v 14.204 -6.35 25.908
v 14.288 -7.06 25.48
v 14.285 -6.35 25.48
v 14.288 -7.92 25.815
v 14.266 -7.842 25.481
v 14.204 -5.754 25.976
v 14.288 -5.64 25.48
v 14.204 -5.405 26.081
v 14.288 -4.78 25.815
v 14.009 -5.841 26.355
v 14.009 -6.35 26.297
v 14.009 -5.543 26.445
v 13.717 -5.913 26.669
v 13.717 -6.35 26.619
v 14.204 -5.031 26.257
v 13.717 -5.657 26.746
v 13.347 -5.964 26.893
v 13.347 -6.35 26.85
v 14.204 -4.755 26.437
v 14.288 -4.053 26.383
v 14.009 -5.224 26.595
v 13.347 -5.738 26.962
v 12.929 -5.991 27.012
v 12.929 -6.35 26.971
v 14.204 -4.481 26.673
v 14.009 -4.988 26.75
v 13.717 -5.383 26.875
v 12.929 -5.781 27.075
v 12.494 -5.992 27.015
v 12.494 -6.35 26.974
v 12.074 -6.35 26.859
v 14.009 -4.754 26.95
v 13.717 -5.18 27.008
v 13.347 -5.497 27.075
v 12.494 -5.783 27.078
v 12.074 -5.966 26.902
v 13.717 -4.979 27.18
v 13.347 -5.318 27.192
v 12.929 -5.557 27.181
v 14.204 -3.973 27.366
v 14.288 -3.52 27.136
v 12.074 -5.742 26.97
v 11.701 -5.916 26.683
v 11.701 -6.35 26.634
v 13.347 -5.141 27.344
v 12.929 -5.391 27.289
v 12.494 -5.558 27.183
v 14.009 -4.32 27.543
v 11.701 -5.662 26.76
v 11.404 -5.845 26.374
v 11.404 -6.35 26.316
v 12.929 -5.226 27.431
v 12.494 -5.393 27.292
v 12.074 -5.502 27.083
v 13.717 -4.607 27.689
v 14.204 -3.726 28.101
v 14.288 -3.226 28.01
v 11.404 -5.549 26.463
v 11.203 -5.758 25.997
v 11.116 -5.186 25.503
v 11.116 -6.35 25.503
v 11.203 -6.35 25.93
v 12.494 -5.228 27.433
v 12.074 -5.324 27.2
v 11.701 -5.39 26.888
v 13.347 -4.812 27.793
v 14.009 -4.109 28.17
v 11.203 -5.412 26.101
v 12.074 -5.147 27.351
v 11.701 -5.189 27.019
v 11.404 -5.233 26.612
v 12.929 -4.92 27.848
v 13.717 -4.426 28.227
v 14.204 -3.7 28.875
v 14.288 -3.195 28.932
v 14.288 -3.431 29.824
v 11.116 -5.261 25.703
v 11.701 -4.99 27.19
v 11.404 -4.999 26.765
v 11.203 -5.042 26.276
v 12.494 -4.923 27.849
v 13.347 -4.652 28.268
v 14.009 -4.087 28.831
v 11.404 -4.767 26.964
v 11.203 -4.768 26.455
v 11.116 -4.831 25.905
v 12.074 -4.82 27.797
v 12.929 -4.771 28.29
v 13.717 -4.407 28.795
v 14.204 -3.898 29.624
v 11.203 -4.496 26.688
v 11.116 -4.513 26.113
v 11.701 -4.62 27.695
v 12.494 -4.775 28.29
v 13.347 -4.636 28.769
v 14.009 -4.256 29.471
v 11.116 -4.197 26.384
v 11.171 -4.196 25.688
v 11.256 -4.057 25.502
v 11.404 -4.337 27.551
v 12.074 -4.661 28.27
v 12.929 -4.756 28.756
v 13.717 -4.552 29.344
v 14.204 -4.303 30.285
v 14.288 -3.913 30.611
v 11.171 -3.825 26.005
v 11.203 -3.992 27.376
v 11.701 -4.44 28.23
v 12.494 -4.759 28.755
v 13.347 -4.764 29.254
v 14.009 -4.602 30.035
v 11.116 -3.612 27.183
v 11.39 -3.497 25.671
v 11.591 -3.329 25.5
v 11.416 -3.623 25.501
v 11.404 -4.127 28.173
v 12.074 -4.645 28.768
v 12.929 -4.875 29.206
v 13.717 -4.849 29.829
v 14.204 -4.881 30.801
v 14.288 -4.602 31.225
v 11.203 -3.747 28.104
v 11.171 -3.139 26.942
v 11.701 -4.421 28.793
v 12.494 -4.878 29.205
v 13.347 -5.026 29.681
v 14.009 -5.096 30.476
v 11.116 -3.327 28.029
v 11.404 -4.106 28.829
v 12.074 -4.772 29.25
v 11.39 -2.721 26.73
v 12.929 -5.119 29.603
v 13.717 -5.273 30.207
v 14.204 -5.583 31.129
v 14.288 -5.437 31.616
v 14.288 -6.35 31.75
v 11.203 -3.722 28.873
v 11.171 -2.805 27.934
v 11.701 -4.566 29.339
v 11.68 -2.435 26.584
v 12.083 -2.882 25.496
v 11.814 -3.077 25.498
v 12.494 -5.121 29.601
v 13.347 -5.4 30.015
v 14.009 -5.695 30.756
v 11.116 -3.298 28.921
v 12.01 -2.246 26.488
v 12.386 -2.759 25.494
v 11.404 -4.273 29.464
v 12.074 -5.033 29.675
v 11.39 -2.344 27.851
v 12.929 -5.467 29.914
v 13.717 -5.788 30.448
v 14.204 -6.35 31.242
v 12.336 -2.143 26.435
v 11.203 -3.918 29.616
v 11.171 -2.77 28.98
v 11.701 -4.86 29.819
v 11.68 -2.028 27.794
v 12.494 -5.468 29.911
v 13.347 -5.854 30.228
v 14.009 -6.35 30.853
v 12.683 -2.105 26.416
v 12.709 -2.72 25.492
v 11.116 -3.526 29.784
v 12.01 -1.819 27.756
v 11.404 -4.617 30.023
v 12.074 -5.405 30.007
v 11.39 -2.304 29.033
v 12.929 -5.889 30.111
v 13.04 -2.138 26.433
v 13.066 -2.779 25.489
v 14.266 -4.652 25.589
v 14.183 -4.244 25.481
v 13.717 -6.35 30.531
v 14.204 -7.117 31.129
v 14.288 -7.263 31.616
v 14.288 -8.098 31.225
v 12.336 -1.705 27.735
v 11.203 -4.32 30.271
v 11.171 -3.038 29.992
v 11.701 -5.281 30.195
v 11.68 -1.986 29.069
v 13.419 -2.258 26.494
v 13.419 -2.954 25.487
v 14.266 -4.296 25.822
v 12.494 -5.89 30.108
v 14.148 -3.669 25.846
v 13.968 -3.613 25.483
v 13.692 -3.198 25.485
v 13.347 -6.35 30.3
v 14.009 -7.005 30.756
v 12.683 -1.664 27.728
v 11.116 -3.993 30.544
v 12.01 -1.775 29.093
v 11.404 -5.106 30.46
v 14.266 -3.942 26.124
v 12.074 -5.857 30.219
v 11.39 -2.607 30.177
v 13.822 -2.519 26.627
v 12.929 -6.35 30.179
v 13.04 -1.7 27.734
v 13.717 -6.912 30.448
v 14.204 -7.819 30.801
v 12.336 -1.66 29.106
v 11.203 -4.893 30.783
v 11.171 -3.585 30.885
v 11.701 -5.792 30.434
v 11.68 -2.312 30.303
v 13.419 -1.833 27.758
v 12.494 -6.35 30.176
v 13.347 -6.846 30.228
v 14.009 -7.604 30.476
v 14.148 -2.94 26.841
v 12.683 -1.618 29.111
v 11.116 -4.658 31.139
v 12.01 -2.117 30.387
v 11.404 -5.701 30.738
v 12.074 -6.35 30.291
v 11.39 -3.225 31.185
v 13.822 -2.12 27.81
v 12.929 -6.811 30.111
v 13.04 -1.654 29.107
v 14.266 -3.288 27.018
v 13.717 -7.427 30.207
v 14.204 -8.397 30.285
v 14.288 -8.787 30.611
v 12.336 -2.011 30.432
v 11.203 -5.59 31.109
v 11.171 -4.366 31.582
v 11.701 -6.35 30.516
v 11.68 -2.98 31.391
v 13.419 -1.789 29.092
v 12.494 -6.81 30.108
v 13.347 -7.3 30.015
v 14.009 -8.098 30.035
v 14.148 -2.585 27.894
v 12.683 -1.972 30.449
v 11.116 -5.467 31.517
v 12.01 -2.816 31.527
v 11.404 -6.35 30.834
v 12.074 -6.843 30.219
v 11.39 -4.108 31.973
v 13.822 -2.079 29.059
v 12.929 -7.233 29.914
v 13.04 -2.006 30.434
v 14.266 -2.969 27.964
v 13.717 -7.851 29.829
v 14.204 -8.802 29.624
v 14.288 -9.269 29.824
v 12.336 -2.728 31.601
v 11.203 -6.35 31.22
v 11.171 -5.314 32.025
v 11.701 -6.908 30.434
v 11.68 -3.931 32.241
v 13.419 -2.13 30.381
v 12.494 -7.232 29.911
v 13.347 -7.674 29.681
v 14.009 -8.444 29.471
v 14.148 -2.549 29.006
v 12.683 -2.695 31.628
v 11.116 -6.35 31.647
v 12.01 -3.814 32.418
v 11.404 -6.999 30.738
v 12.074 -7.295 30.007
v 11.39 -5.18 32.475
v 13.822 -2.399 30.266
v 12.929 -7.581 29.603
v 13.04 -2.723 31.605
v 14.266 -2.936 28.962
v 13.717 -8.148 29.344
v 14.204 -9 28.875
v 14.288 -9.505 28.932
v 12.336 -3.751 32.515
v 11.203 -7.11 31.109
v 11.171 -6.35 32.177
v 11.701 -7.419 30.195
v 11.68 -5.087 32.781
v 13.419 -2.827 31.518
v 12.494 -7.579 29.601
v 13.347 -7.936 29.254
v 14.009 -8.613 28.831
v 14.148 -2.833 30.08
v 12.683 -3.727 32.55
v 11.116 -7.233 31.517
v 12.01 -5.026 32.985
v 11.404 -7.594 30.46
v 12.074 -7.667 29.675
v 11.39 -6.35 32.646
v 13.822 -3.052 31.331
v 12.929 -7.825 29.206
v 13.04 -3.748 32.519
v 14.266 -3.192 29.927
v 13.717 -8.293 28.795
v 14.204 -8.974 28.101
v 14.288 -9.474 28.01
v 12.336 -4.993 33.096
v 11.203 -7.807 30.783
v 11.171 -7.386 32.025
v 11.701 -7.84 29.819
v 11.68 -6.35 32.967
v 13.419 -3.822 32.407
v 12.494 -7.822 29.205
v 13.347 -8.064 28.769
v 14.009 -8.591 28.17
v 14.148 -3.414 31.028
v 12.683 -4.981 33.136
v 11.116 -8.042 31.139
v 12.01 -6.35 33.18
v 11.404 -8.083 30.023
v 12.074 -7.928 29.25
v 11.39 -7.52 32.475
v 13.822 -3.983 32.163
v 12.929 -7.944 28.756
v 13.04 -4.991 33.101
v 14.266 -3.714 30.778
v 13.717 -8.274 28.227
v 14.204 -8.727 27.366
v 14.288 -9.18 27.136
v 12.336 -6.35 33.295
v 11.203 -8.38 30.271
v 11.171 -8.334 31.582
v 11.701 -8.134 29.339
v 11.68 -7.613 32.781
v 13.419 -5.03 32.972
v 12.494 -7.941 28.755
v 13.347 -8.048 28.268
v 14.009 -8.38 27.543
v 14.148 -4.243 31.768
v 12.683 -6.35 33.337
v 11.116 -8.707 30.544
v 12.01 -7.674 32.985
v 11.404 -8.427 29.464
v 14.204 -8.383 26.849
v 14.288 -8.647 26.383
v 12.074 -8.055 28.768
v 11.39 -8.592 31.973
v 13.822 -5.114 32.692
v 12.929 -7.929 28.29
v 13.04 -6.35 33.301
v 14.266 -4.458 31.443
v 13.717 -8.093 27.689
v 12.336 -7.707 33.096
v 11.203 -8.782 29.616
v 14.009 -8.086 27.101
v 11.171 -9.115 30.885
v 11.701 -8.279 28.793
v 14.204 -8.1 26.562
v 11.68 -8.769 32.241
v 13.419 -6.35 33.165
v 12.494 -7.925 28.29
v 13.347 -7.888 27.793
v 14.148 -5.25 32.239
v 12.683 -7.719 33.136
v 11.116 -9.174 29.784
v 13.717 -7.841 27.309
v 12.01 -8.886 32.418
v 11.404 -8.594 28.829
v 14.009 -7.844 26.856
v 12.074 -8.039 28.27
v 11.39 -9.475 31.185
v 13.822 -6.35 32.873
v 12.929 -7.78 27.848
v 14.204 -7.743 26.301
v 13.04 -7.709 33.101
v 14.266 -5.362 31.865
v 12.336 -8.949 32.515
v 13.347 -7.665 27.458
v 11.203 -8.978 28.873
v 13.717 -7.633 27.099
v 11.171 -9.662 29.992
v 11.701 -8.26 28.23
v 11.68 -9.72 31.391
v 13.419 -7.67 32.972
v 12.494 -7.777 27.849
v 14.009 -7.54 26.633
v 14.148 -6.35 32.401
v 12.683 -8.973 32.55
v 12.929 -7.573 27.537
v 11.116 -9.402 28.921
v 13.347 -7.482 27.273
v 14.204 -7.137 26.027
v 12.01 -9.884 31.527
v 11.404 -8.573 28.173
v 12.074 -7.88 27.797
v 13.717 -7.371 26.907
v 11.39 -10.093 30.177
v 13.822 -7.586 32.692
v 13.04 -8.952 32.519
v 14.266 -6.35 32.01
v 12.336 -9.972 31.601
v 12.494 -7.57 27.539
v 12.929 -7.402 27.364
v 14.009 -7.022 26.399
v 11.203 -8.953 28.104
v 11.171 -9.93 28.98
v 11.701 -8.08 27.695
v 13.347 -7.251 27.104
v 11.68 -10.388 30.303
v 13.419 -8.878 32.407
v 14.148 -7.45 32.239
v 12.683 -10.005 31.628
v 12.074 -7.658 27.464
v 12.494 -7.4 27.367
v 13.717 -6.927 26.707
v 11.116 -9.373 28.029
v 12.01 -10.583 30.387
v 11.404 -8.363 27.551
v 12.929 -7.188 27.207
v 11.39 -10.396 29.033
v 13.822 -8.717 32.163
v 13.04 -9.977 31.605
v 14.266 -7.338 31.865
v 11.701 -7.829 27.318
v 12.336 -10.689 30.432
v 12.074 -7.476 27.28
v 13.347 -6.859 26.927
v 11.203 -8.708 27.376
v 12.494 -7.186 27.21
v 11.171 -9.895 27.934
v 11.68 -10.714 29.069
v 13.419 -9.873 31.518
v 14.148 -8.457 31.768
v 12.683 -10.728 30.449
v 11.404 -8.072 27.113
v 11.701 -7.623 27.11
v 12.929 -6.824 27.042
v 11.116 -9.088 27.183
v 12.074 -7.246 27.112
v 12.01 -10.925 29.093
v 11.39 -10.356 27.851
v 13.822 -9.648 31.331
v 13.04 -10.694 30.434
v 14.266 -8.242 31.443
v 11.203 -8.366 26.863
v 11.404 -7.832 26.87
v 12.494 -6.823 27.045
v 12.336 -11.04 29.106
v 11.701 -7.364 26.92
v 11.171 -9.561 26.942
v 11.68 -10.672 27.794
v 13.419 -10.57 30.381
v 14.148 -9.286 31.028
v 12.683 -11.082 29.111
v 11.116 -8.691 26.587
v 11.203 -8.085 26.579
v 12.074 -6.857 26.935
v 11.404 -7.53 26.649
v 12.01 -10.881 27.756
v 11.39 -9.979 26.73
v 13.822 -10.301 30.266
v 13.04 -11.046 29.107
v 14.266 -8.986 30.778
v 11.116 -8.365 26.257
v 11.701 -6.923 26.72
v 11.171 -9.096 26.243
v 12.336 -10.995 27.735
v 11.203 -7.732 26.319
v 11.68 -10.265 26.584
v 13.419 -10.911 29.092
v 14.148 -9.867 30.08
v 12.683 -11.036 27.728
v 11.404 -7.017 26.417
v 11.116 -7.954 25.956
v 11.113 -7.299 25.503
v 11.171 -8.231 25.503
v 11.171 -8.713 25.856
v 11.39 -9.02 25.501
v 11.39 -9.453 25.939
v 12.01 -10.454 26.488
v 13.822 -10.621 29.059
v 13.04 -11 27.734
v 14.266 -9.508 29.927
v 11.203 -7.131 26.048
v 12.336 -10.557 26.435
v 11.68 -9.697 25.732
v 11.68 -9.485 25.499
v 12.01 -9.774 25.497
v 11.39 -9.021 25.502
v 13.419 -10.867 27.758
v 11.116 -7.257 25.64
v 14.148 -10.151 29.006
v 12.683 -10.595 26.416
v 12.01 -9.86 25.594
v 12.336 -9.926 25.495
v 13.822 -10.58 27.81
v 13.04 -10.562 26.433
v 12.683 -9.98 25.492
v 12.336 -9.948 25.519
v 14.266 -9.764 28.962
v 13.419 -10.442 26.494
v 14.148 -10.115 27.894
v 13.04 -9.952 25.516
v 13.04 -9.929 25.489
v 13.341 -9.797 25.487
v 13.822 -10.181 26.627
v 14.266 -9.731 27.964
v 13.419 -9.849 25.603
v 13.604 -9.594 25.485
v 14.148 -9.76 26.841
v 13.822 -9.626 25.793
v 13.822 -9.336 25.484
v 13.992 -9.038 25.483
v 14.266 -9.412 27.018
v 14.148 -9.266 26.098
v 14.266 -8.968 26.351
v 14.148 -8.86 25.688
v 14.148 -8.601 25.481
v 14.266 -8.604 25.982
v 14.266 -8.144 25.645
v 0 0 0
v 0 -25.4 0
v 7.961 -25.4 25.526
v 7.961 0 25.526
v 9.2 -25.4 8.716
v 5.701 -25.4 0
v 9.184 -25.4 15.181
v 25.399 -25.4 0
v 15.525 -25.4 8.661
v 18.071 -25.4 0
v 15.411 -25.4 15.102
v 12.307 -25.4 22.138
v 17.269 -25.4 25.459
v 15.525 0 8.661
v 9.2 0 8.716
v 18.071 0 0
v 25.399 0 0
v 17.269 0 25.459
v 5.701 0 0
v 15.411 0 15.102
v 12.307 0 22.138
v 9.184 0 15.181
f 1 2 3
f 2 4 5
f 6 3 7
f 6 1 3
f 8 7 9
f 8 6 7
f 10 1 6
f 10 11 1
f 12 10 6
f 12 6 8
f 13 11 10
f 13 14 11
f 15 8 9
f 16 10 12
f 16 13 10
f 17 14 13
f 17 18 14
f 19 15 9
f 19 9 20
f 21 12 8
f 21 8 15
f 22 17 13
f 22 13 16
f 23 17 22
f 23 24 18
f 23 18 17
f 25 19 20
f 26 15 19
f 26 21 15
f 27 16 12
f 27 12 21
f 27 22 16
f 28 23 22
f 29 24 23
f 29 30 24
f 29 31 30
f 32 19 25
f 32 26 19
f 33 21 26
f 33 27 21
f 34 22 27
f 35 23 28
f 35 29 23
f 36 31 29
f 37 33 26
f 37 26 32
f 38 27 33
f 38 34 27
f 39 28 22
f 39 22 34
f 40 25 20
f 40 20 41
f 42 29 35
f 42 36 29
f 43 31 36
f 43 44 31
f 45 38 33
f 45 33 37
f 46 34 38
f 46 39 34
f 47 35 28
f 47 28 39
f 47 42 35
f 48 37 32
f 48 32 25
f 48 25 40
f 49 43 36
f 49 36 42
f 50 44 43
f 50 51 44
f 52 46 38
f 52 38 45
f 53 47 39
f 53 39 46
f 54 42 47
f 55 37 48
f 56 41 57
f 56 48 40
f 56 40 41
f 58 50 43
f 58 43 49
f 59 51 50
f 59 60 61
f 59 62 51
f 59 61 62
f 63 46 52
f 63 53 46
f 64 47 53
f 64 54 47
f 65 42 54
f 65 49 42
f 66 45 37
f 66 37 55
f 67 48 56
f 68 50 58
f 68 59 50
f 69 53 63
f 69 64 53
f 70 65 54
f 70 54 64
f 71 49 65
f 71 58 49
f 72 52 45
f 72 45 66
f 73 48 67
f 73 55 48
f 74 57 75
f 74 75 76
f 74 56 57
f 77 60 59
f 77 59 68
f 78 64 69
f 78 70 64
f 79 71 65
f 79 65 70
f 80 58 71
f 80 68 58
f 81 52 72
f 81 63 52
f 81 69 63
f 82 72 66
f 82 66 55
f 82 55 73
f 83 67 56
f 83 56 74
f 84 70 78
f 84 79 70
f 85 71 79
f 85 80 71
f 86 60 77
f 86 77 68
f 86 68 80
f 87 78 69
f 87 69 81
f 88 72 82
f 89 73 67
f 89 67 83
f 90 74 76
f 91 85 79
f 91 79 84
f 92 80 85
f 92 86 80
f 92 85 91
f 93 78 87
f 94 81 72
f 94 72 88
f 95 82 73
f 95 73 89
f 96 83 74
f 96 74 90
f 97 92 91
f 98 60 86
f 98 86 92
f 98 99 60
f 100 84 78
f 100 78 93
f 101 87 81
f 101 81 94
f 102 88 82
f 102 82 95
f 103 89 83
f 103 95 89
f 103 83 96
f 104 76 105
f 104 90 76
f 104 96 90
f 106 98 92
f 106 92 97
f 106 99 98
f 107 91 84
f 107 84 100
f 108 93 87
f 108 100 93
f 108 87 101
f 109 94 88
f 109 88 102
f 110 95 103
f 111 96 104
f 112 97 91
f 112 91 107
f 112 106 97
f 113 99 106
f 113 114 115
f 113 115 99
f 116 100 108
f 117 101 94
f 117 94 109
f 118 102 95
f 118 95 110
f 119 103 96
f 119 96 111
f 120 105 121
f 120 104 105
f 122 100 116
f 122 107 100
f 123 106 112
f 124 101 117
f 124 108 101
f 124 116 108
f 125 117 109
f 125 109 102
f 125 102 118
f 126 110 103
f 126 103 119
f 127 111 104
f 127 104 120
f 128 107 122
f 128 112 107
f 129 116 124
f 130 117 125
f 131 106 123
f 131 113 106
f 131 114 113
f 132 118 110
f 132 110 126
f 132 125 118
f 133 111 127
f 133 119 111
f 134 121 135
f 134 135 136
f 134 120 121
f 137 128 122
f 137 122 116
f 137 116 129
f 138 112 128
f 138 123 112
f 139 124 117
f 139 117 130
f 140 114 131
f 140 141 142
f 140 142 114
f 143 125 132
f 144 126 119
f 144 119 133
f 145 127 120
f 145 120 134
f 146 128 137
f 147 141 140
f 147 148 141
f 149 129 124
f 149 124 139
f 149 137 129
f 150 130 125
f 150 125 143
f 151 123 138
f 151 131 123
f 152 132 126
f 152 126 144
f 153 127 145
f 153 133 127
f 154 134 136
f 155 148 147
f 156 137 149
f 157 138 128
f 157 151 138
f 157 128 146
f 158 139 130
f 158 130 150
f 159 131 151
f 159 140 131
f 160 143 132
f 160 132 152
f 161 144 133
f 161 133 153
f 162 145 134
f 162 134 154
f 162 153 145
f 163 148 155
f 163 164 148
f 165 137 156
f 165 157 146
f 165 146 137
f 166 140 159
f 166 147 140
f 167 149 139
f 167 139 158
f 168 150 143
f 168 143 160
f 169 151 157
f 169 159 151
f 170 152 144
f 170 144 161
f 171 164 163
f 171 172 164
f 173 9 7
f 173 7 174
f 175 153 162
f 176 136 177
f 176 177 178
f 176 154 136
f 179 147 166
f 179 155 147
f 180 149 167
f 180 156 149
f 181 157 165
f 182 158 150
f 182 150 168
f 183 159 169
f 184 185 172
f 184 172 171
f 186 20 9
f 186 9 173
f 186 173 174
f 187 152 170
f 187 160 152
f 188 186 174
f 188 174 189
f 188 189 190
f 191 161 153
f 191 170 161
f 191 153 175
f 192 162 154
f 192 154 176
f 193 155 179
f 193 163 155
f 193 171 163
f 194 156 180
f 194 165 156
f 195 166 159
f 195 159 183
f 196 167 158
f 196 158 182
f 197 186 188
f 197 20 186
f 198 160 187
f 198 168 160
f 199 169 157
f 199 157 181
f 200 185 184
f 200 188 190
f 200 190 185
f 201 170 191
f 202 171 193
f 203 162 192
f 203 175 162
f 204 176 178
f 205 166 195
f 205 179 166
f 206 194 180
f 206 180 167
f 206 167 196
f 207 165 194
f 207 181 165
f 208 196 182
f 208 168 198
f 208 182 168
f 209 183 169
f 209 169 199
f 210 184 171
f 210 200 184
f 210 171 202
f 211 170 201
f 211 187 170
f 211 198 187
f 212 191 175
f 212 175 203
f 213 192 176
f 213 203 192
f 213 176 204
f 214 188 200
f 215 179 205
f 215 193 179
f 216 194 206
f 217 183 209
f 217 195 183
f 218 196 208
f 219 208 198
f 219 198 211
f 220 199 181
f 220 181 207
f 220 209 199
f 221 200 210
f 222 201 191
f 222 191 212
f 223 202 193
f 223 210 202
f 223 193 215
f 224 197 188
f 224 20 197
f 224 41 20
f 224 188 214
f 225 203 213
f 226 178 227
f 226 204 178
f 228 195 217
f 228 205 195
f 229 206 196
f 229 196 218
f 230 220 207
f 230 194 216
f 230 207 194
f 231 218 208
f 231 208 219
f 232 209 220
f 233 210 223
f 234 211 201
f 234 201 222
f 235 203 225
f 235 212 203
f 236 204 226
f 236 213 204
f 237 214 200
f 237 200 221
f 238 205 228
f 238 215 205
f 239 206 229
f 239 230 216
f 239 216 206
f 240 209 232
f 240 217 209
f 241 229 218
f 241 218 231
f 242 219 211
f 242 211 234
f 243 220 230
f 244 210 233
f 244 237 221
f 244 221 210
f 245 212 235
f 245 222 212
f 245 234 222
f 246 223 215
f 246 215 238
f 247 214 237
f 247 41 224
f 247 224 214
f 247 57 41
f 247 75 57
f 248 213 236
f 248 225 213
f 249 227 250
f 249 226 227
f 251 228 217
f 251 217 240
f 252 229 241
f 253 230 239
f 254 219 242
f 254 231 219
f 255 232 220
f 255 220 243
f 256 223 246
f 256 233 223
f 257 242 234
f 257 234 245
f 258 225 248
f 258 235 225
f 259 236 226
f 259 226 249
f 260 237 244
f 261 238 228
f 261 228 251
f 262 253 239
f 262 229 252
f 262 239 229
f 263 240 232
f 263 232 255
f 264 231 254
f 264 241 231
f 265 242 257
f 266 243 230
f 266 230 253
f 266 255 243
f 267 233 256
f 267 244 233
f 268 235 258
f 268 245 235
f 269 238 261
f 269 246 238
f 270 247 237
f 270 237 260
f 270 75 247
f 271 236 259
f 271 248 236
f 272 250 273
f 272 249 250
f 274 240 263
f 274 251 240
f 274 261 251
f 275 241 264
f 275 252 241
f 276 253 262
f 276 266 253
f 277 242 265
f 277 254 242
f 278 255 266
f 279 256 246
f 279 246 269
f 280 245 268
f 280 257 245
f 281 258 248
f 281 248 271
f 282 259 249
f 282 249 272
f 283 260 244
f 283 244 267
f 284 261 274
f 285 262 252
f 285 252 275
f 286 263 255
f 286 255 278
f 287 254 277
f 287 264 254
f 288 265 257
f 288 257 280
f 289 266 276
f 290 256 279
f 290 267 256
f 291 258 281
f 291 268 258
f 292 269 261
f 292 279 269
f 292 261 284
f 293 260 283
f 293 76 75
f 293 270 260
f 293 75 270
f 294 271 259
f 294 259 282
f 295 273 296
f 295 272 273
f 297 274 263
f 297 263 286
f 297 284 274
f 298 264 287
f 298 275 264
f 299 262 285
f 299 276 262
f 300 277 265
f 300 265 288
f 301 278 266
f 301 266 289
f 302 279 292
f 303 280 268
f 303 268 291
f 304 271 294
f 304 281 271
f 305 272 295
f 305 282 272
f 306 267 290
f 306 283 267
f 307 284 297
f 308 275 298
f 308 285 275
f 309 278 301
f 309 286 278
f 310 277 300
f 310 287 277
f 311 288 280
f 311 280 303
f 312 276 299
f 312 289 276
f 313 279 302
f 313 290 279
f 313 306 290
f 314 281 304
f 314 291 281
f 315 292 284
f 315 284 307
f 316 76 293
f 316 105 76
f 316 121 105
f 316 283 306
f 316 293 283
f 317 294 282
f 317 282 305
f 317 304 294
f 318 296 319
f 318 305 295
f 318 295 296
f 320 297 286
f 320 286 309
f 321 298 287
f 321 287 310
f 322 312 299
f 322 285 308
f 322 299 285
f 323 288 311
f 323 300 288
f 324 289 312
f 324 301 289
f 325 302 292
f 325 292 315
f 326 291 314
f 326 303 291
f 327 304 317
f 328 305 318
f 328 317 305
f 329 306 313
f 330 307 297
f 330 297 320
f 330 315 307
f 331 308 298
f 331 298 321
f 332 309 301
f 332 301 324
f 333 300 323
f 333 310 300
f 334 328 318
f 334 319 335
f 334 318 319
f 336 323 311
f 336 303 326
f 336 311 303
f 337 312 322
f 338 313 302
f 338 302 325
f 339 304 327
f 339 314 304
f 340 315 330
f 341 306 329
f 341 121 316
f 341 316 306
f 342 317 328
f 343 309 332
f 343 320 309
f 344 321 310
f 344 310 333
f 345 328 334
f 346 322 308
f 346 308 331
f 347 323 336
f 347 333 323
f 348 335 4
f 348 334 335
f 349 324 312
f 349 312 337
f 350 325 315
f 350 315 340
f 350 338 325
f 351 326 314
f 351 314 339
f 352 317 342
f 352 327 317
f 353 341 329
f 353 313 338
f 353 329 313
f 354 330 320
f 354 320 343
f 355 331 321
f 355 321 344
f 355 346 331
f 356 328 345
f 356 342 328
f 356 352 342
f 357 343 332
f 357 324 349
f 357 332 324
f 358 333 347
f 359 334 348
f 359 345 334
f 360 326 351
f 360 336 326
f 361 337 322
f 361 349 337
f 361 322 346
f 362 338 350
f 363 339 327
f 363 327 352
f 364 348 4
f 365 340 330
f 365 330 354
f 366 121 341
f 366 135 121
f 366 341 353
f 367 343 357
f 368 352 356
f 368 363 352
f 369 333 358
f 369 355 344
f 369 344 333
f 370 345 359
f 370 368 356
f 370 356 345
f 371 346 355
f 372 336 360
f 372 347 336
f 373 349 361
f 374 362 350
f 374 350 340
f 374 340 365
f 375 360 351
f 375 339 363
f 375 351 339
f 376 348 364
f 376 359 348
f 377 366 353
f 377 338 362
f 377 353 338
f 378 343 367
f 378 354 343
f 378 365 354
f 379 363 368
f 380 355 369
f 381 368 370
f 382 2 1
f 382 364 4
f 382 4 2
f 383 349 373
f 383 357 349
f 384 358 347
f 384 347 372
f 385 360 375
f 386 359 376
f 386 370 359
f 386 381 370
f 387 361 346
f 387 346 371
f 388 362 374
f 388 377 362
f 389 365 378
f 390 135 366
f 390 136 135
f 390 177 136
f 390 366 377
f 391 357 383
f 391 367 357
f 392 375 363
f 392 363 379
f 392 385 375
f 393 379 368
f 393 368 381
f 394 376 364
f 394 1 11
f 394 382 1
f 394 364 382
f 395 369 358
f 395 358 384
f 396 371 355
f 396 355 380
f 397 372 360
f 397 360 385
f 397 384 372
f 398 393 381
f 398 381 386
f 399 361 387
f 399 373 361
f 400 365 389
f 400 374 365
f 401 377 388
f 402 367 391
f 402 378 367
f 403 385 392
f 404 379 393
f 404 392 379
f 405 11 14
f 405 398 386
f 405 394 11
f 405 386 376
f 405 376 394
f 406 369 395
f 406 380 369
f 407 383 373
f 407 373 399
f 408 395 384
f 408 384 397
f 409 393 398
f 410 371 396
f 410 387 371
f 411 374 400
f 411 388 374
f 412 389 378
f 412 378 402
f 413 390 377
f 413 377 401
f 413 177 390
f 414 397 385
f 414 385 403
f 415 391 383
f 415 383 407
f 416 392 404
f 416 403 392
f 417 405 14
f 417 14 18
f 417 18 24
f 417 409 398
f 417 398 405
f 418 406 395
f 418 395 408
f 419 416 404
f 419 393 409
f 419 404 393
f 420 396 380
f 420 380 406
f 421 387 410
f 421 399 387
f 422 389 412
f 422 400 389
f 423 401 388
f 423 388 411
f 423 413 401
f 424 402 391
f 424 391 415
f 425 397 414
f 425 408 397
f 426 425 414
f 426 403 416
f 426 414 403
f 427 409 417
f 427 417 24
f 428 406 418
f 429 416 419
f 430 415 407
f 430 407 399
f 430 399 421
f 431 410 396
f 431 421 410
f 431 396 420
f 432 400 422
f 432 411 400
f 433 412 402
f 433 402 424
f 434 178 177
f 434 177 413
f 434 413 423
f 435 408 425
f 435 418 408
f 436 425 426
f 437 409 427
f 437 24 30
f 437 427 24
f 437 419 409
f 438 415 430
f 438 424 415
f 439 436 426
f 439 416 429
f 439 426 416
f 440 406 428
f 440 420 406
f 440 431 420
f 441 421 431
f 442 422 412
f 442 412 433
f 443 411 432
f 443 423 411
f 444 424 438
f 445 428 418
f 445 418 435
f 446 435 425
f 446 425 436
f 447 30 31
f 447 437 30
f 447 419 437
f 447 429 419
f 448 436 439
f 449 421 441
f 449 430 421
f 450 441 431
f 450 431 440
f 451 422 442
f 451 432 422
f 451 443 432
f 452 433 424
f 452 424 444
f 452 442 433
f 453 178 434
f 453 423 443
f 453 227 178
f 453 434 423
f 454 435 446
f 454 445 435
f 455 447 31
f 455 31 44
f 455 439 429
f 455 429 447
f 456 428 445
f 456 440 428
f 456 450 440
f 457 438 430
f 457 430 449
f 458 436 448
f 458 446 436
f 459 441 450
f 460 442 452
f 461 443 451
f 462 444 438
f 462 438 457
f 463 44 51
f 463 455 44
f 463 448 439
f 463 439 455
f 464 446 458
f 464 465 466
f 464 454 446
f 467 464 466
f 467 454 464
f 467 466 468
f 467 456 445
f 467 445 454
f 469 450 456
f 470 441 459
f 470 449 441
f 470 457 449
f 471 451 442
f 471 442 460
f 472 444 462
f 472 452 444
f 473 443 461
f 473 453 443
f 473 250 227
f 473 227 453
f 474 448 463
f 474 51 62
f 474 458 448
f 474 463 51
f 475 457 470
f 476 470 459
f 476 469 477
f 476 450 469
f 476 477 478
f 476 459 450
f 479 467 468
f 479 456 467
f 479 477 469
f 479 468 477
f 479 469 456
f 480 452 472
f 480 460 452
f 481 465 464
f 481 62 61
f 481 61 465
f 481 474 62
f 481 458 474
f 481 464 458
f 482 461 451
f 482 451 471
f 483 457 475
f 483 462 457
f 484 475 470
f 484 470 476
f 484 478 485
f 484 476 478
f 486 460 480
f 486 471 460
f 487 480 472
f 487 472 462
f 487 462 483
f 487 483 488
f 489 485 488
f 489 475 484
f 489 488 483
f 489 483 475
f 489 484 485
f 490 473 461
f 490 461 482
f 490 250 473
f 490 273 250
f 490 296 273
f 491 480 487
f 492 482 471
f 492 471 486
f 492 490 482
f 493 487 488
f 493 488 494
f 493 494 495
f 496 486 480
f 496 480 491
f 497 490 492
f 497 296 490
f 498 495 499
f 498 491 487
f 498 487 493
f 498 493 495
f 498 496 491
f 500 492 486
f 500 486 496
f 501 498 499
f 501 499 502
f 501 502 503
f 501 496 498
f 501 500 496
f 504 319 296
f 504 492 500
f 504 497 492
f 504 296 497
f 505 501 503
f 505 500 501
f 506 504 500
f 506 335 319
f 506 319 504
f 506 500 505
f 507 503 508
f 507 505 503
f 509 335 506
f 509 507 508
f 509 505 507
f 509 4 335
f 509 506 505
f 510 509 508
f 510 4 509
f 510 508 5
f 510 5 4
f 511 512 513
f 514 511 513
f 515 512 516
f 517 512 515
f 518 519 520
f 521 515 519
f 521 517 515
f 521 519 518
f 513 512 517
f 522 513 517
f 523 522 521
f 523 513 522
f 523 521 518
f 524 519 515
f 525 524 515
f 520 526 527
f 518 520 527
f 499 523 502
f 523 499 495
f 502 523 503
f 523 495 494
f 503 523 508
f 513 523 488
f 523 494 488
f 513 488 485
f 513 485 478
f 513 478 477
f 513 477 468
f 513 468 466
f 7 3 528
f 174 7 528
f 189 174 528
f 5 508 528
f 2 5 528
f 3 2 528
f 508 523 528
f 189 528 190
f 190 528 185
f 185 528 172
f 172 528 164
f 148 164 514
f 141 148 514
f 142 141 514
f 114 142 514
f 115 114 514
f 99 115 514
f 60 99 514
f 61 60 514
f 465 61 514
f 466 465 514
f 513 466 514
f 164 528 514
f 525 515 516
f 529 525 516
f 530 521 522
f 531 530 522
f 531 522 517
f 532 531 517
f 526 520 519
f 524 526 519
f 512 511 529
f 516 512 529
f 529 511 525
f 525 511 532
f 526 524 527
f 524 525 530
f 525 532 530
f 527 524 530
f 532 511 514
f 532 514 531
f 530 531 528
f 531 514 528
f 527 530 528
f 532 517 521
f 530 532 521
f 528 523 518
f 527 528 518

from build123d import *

# Parameters (mm, degrees)
F1_DEPTH = 25.4
F3_DEPTH = 25.4
F5_R     = 1.5875


with BuildPart() as f1:
    # F0 (on Front) → F1 (new body)
    with BuildSketch(Plane.XZ):
        Polygon((25.399335, 25.4), (0, 25.583795), (0, 0), (25.399335, 0), align=None)
    extrude(amount=F1_DEPTH)

    # F2 (on face) → F3 (cut)
    with BuildSketch(Plane.XZ.offset(25.4)):
        Polygon((0, 0), (7.961136, 25.526187), (0, 25.583795), align=None)
        Polygon((9.200284, 8.716307), (5.701287, 0), (18.071296, 0), (15.525086, 8.660929), align=None)
        Polygon((25.399335, 25.4), (17.26905, 25.458833), (25.399335, 0), align=None)
        Polygon((9.184068, 15.181166), (15.411005, 15.101977), (12.307478, 22.137856), align=None)
    extrude(amount=-F3_DEPTH, mode=Mode.SUBTRACT)

    # F5 (on offset) → F6 (revolve)
    with BuildSketch(Plane.XZ.offset(6.35)):
        with Locations((12.7, 25.4)):
            Circle(F5_R)
    revolve(axis=Axis((14.252264, -6.35, 28.575), (1, 0, 0)))


solid = f1.part
